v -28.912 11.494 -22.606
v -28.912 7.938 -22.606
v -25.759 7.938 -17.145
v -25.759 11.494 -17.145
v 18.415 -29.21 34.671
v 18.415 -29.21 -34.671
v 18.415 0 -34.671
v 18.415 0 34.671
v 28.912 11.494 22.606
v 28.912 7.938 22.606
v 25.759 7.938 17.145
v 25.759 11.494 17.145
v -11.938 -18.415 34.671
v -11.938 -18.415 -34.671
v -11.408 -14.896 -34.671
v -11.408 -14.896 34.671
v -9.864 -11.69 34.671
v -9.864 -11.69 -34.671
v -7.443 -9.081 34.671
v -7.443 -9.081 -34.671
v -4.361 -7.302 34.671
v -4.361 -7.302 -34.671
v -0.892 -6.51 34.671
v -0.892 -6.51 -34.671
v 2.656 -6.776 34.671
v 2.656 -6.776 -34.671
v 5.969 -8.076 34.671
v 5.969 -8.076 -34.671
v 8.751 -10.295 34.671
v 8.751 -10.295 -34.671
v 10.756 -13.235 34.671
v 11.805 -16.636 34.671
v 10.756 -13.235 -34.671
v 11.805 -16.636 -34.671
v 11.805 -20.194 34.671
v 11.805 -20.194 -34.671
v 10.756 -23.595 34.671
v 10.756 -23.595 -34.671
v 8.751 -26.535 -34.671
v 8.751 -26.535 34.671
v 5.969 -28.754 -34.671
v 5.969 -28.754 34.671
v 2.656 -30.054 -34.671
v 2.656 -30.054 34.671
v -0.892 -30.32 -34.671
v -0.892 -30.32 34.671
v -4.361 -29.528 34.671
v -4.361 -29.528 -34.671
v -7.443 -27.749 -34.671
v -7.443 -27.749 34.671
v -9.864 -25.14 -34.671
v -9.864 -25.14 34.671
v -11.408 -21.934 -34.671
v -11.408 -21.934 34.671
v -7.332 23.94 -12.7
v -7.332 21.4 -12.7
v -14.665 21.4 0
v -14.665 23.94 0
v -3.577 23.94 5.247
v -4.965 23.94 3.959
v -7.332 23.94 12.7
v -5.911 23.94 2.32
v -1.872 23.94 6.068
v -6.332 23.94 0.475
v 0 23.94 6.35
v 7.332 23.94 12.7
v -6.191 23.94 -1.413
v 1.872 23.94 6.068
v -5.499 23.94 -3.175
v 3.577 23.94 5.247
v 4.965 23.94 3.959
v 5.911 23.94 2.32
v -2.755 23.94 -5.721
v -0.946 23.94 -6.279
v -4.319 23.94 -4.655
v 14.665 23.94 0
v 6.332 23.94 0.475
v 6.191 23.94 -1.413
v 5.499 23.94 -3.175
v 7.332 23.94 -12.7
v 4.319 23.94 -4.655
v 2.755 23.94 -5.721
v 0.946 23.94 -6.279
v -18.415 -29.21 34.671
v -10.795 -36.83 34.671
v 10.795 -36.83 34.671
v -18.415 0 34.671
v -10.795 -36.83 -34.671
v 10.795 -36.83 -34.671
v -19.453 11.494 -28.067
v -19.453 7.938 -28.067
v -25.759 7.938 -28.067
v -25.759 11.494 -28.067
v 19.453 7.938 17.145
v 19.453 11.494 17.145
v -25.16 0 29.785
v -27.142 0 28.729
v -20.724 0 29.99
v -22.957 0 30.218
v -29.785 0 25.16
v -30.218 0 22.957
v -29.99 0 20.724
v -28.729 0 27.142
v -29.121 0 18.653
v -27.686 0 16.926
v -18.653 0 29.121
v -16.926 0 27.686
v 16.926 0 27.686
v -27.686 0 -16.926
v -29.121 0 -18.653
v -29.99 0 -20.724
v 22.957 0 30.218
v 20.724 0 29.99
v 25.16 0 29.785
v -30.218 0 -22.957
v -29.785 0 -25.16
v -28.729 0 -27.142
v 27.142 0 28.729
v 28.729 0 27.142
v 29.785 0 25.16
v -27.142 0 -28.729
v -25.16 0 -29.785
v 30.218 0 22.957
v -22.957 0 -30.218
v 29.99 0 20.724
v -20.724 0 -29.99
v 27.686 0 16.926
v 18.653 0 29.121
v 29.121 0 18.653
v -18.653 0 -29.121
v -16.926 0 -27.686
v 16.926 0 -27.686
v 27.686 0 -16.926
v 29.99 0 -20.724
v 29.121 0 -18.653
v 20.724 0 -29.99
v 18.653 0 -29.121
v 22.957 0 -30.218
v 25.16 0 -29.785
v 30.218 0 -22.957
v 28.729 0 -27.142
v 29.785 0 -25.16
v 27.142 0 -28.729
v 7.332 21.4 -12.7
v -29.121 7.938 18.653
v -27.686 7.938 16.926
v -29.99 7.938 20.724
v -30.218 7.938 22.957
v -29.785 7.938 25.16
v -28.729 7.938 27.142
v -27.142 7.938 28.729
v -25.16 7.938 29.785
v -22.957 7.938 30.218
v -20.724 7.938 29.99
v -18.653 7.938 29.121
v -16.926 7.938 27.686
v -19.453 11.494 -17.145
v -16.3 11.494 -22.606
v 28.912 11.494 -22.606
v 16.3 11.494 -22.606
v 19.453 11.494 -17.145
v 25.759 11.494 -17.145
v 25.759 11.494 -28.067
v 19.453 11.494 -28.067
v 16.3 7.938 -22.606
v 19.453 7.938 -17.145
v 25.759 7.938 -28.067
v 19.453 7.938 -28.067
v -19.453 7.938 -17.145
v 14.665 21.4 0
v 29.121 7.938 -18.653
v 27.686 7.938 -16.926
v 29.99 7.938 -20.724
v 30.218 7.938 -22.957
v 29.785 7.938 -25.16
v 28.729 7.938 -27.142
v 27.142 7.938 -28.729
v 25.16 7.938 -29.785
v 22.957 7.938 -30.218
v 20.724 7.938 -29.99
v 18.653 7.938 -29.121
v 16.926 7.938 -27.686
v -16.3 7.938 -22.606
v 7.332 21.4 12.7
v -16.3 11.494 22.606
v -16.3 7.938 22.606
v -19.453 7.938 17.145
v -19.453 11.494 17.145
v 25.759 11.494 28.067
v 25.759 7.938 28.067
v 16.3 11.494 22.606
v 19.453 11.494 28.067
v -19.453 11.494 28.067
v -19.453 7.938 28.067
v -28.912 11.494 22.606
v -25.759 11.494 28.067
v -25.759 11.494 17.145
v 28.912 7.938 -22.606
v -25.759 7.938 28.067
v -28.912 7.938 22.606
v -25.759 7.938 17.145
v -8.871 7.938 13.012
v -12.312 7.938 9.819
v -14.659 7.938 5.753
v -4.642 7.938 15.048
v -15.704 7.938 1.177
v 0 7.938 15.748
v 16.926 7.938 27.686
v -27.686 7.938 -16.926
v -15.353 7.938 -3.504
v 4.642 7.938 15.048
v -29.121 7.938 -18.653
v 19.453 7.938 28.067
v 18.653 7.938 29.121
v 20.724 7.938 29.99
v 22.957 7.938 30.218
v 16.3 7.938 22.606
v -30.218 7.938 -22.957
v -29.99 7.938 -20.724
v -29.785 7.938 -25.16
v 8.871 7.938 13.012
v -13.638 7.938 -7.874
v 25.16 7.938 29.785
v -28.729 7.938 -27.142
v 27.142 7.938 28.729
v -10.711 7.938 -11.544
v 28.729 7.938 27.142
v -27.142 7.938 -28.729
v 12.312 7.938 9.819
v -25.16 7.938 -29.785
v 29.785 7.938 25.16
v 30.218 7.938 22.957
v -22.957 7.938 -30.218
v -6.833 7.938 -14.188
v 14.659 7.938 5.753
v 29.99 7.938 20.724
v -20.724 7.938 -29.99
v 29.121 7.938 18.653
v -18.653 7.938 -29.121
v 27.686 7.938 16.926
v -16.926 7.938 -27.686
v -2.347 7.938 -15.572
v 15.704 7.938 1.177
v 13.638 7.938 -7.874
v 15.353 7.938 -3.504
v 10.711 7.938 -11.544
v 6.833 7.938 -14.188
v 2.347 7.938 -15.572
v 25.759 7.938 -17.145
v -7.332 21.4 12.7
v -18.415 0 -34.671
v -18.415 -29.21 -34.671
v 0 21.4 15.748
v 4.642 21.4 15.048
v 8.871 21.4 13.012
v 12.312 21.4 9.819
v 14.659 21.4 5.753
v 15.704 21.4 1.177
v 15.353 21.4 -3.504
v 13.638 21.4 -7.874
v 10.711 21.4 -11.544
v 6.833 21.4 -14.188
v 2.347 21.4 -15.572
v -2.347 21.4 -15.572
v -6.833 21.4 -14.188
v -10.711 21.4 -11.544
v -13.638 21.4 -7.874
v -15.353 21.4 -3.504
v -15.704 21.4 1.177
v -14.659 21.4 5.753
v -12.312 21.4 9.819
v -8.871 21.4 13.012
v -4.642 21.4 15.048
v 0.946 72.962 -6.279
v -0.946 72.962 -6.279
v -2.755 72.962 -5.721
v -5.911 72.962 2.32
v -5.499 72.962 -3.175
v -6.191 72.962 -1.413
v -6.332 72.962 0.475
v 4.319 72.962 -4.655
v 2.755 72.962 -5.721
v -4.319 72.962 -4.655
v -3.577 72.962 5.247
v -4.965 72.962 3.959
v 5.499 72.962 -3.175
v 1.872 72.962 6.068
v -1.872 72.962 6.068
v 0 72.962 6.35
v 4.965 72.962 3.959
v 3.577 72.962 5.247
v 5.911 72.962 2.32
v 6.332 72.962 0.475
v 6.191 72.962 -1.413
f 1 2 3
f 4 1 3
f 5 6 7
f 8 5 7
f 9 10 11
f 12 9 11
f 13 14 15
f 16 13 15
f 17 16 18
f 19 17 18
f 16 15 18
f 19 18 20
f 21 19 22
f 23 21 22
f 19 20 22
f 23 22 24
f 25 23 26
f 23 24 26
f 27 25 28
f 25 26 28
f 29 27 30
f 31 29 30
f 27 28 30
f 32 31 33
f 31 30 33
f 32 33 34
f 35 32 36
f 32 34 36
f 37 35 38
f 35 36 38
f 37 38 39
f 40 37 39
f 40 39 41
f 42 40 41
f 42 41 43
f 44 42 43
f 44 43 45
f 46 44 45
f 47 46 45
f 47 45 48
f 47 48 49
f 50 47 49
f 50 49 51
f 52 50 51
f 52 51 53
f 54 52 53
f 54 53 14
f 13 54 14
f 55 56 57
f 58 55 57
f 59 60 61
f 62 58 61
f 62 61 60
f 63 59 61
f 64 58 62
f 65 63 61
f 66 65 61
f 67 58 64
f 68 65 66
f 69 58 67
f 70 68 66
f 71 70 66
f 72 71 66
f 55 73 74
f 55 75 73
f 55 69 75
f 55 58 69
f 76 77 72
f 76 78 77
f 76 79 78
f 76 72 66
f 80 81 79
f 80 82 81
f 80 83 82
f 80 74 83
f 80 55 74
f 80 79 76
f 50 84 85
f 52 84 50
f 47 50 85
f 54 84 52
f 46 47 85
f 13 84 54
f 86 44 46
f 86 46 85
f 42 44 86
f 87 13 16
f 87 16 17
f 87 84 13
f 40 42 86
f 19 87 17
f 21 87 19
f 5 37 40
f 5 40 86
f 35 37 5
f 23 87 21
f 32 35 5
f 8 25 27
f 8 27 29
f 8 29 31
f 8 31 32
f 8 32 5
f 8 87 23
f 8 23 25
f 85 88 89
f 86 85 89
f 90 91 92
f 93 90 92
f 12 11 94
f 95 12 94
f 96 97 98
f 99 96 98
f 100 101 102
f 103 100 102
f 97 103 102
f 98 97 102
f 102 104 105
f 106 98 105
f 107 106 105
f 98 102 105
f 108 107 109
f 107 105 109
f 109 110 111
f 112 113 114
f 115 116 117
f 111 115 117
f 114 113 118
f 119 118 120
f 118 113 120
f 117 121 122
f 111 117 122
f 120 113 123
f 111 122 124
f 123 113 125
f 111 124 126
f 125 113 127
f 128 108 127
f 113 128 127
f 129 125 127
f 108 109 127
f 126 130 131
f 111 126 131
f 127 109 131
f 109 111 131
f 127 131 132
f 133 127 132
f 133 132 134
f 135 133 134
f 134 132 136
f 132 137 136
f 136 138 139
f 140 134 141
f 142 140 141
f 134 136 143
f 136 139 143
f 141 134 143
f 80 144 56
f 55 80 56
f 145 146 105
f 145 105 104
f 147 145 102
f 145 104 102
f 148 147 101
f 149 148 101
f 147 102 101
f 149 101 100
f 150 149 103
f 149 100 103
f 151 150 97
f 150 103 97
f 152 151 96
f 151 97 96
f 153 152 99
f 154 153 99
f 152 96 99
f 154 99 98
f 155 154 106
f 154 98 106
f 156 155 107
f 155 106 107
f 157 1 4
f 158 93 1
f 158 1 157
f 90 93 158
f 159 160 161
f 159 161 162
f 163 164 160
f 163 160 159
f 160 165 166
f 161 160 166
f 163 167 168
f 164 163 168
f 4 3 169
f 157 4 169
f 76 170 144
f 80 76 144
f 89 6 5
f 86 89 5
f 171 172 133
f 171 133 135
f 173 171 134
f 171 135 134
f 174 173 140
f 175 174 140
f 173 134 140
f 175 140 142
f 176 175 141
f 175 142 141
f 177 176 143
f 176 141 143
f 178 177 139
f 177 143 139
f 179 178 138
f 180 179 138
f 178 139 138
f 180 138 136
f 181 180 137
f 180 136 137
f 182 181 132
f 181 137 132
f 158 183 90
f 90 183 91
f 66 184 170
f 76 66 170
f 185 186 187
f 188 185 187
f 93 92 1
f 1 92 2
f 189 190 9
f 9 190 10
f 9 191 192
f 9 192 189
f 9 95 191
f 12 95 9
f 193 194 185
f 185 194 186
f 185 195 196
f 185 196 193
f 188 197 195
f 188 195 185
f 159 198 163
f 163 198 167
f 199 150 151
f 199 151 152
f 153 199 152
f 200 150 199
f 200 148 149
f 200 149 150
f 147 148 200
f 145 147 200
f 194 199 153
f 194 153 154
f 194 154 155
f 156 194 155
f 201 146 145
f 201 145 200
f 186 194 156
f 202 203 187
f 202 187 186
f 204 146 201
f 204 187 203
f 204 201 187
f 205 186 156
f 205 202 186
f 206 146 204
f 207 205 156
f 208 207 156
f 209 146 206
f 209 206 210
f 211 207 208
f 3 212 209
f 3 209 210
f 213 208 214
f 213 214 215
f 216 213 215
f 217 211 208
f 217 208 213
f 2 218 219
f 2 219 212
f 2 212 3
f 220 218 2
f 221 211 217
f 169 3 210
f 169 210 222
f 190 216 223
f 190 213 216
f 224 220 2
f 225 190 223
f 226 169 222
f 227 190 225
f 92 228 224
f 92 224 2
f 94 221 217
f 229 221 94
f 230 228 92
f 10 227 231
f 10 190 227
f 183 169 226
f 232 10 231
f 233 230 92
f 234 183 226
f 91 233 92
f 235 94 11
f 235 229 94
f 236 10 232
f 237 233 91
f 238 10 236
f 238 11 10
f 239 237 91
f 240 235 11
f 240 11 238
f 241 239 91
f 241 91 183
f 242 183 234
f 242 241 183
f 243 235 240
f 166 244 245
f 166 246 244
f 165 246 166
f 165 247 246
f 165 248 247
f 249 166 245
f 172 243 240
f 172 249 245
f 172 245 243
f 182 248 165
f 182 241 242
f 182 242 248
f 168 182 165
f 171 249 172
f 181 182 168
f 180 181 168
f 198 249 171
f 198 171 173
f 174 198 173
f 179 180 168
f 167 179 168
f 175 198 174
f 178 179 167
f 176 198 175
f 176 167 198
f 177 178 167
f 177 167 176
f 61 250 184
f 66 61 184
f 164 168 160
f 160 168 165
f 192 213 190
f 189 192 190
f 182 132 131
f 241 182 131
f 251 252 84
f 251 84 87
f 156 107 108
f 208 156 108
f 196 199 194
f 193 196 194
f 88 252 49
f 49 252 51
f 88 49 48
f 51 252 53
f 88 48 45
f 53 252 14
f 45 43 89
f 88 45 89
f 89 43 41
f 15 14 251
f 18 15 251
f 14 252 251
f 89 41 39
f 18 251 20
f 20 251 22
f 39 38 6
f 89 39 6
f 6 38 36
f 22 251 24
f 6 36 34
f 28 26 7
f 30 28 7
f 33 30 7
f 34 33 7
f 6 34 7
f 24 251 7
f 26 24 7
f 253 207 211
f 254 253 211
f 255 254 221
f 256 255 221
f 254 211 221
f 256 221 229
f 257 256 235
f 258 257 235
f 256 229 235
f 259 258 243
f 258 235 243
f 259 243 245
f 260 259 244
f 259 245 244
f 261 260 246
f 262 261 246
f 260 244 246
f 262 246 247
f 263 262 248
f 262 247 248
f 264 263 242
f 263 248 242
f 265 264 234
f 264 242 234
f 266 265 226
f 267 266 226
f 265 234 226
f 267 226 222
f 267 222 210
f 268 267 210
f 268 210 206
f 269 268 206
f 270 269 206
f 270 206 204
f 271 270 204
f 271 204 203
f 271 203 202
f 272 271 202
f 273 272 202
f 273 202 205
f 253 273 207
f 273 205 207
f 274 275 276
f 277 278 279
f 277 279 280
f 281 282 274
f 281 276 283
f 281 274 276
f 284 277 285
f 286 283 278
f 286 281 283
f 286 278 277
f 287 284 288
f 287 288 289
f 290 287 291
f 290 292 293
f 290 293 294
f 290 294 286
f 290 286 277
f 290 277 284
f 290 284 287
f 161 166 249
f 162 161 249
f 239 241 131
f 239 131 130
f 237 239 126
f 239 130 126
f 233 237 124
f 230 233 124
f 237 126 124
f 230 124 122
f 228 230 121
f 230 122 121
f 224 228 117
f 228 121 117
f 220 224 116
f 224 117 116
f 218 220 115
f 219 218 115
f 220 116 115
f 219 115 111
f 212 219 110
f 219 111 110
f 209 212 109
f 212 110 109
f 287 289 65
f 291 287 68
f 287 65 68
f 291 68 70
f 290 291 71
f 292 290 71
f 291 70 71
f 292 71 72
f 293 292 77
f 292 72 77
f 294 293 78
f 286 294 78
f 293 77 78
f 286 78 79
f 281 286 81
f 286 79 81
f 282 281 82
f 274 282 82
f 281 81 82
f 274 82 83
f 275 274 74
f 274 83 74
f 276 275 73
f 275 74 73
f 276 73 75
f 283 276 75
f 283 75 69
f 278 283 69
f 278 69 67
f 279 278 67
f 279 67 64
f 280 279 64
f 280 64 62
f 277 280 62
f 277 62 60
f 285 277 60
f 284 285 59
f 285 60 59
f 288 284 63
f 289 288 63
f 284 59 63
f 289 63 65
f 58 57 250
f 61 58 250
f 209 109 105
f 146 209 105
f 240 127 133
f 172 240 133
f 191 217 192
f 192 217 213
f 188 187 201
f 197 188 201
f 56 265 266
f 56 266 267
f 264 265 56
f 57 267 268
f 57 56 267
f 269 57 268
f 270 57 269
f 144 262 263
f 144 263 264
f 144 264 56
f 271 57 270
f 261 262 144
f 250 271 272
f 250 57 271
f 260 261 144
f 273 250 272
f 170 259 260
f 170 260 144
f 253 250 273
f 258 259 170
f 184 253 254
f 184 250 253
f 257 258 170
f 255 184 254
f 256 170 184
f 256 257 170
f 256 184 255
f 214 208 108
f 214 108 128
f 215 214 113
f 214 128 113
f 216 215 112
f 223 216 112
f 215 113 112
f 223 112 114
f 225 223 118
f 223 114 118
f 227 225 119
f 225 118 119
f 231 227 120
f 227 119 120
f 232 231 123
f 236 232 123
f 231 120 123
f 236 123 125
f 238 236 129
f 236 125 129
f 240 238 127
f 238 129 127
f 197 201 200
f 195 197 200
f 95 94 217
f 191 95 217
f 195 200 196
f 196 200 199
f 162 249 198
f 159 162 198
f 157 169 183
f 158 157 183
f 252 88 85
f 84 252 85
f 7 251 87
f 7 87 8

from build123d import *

# Parameters (mm, degrees)
BOSS_EXTRUDE1_DEPTH      = 7.9375
BOSS_EXTRUDE2_DEPTH      = 6.985
BOSS_EXTRUDE2_DEPTH_BACK = 62.357
SKETCH2_W                = 36.83
SKETCH2_H                = 36.83
SKETCH3_R                = 11.938
CUT_EXTRUDE1_DEPTH       = 85.133066864
BOSS_EXTRUDE3_DEPTH      = 3.556
SKETCH7_R                = 15.748
BOSS_EXTRUDE4_DEPTH      = 13.462
BOSS_EXTRUDE5_DEPTH      = 2.54
SKETCH9_R                = 6.35
BOSS_EXTRUDE6_DEPTH      = 49.022
CHAMFER1_SIZE            = 7.62


with BuildPart() as part:
    # Sketch1 → Boss-Extrude1 (new body)
    with BuildSketch(Plane(origin=(0, 0, 0), x_dir=(1, 0, 0), z_dir=(0, 1, 0))):
        with BuildLine():
            Line((16.926387337, 27.686), (-16.926387337, 27.686))
            ThreePointArc((-16.926387337, 27.686), (-27.994153673, 27.994153673), (-27.686, 16.926387337))
            Line((-27.686, 16.926387337), (-27.686, -16.926387337))
            ThreePointArc((-27.686, -16.926387337), (-27.994153673, -27.994153673), (-16.926387337, -27.686))
            Line((-16.926387337, -27.686), (16.926387337, -27.686))
            ThreePointArc((16.926387337, -27.686), (27.994153673, -27.994153673), (27.686, -16.926387337))
            Line((27.686, -16.926387337), (27.686, 16.926387337))
            ThreePointArc((27.686, 16.926387337), (27.994153673, 27.994153673), (16.926387337, 27.686))
        make_face()
    extrude(amount=BOSS_EXTRUDE1_DEPTH)

    # Sketch6 → Boss-Extrude3 (add)
    with BuildSketch(Plane(origin=(0, 7.9375, 0), x_dir=(1, 0, 0), z_dir=(0, 1, 0))):
        Polygon((16.30018036, -22.606), (19.45309018, -28.067), (25.75890982, -28.067), (28.91181964, -22.606), (25.75890982, -17.145), (19.45309018, -17.145), align=None)
        Polygon((-16.30018036, -22.606), (-19.45309018, -17.145), (-25.75890982, -17.145), (-28.91181964, -22.606), (-25.75890982, -28.067), (-19.45309018, -28.067), align=None)
        Polygon((-16.30018036, 22.606), (-19.45309018, 28.067), (-25.75890982, 28.067), (-28.91181964, 22.606), (-25.75890982, 17.145), (-19.45309018, 17.145), align=None)
        Polygon((16.30018036, 22.606), (19.45309018, 17.145), (25.75890982, 17.145), (28.91181964, 22.606), (25.75890982, 28.067), (19.45309018, 28.067), align=None)
    extrude(amount=BOSS_EXTRUDE3_DEPTH)

    # Sketch7 → Boss-Extrude4 (add)
    with BuildSketch(Plane(origin=(0, 7.9375, 0), x_dir=(1, 0, 0), z_dir=(0, 1, 0))):
        with Locations(Location((0, 0, 0), (0, 0, 270))):
            Circle(SKETCH7_R)
    extrude(amount=BOSS_EXTRUDE4_DEPTH)

    # Sketch8 → Boss-Extrude5 (add)
    with BuildSketch(Plane(origin=(0, 21.3995, 0), x_dir=(1, 0, 0), z_dir=(0, 1, 0))):
        Polygon((14.664696837, 0), (7.332348419, 12.7), (-7.332348419, 12.7), (-14.664696837, 0), (-7.332348419, -12.7), (7.332348419, -12.7), align=None)
    extrude(amount=BOSS_EXTRUDE5_DEPTH)

    # Sketch9 → Boss-Extrude6 (add)
    with BuildSketch(Plane(origin=(0, 23.9395, 0), x_dir=(1, 0, 0), z_dir=(0, 1, 0))):
        with Locations(Location((0, 0, 0), (0, 0, 270))):
            Circle(SKETCH9_R)
    extrude(amount=BOSS_EXTRUDE6_DEPTH)


with BuildPart() as body_2:
    # Sketch2 → Boss-Extrude2 (new, two sides: drawn at the far end of the back side and taken through both)
    with BuildSketch(Plane.XY.offset(27.686).offset(-BOSS_EXTRUDE2_DEPTH_BACK)):
        with Locations((0, -18.415)):
            Rectangle(SKETCH2_W, SKETCH2_H)
    extrude(amount=BOSS_EXTRUDE2_DEPTH + BOSS_EXTRUDE2_DEPTH_BACK)

    # Sketch3 → Cut-Extrude1 (cut, through all)
    with BuildSketch(Plane(origin=(0, 0, -34.671), x_dir=(-1, 0, 0), z_dir=(0, 0, -1))):
        with Locations((0, -18.415)):
            Circle(SKETCH3_R)
    extrude(amount=-CUT_EXTRUDE1_DEPTH, mode=Mode.SUBTRACT)

    # Chamfer1
    chamfer1_edges = [body_2.edges().sort_by_distance(p)[0] for p in [
        (18.415, -36.83, 0),
        (-18.415, -36.83, 0),
    ]]
    chamfer(chamfer1_edges, length=CHAMFER1_SIZE)


solid = Compound([part.part, body_2.part])
